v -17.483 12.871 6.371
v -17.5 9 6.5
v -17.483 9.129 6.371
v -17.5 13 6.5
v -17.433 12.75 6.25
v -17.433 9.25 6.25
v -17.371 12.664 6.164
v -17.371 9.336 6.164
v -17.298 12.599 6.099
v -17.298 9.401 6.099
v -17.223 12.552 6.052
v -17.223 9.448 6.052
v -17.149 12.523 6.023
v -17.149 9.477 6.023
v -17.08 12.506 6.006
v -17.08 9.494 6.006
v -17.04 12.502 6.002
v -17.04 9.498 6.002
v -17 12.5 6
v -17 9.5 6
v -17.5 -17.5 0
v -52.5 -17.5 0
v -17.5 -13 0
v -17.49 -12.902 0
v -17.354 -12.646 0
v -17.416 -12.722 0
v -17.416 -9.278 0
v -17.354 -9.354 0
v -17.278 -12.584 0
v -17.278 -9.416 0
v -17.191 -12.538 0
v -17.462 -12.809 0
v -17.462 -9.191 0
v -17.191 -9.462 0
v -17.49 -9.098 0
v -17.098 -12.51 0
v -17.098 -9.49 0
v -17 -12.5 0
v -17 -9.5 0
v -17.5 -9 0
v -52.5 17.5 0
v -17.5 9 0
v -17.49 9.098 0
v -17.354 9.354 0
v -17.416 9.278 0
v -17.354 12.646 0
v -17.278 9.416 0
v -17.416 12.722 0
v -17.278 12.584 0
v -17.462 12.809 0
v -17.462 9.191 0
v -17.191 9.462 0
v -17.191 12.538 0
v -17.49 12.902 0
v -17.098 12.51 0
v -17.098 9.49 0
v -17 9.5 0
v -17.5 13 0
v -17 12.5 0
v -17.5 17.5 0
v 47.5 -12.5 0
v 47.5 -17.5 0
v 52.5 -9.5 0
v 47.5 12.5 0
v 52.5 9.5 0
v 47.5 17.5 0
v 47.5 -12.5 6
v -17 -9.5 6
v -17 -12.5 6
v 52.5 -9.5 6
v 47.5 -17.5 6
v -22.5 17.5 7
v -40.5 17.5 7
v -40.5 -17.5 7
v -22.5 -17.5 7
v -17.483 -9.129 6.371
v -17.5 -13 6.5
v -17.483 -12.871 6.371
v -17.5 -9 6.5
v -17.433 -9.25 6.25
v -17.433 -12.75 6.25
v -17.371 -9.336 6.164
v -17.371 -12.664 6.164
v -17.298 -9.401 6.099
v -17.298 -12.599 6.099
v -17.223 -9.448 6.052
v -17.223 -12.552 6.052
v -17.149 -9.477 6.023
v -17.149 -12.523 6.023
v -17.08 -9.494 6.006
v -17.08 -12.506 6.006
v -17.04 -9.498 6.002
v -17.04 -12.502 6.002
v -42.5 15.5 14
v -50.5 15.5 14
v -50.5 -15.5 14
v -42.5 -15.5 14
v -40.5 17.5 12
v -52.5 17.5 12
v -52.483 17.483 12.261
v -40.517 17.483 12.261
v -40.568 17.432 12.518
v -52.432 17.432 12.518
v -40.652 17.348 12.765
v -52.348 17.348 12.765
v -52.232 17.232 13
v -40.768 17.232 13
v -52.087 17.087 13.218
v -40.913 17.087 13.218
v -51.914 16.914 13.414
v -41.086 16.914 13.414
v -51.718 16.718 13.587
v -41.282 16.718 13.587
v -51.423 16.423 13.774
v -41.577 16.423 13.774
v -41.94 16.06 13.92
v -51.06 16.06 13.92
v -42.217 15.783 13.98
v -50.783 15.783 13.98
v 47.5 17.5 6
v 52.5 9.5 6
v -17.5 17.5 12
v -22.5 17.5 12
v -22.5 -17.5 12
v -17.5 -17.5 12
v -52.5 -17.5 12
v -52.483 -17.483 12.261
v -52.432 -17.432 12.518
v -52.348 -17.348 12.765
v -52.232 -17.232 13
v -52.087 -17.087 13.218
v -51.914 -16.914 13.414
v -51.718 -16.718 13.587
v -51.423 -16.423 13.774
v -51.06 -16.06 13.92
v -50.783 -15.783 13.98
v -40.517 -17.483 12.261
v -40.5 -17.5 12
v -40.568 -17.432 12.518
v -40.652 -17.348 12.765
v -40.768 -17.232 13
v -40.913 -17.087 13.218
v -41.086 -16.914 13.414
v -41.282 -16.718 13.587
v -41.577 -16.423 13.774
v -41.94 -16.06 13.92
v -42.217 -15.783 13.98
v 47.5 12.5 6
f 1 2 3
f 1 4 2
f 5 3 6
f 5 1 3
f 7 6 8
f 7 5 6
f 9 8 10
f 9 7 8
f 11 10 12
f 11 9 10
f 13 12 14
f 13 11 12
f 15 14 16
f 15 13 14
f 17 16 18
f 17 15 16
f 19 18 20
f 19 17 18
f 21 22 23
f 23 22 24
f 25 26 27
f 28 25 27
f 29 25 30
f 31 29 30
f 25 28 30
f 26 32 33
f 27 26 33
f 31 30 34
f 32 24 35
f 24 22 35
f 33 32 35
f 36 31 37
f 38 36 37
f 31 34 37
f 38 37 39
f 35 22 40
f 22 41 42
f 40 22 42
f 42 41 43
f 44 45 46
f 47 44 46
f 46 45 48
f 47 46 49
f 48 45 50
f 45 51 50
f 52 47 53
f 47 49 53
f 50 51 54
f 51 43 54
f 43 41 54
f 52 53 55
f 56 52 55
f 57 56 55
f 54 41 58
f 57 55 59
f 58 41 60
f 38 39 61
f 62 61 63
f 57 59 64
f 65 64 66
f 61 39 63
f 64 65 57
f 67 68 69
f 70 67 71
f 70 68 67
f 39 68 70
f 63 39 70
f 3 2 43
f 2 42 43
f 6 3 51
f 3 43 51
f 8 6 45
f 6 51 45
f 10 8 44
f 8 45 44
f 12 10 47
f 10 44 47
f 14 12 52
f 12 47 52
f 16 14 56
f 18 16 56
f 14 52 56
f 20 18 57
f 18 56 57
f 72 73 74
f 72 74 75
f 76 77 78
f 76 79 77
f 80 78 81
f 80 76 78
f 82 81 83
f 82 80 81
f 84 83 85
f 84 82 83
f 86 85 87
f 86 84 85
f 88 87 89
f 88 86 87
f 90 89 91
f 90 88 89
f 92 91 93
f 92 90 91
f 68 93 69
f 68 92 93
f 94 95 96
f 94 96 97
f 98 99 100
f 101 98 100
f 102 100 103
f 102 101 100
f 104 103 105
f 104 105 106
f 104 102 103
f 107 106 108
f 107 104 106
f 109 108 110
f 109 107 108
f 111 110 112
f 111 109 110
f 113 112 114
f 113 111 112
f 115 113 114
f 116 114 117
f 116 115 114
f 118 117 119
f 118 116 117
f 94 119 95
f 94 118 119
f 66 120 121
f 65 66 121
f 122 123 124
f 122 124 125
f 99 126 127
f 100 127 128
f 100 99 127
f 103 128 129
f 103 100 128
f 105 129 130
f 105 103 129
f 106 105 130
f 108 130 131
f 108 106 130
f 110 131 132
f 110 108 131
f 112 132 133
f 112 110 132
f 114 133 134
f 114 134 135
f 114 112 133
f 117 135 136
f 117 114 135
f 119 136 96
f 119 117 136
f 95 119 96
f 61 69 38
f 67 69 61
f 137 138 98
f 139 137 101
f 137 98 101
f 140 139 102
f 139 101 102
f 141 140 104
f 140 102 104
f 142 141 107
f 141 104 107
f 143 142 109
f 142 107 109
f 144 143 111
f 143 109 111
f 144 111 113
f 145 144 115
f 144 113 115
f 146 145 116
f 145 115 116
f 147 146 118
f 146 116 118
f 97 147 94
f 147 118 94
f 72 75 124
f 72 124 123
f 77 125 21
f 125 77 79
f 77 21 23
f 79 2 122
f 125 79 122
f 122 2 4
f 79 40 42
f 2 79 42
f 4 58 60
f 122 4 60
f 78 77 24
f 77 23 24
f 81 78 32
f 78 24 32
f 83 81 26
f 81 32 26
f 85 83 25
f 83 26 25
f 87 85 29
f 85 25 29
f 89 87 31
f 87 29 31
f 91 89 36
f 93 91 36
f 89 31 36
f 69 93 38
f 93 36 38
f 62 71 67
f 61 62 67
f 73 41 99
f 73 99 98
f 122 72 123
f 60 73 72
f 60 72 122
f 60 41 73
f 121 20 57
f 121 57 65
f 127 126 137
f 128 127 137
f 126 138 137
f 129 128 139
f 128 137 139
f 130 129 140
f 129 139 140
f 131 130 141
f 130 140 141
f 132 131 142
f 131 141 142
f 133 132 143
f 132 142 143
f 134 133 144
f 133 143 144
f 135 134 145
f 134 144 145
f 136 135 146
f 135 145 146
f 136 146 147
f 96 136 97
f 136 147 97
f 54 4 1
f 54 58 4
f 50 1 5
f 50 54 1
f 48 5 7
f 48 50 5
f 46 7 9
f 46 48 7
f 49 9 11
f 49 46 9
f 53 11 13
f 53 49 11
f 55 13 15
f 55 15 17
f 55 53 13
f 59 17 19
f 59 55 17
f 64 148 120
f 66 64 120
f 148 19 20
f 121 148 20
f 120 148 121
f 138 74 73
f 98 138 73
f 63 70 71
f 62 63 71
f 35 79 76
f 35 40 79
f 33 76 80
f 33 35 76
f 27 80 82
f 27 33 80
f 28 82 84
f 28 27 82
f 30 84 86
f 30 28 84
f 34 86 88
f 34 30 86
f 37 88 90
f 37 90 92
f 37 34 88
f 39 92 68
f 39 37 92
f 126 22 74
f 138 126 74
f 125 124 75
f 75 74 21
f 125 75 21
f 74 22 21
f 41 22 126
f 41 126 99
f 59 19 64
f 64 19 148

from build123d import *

# Parameters (mm, degrees)
F0_W      = 105
F0_H      = 35
F1_DEPTH  = 7
F2_W      = 70
F2_H      = 19
F3_DEPTH  = 7.001
F5_DEPTH  = 7.001
F7_DEPTH  = 7.001
F8_W      = 65
F8_H      = 5
F9_DEPTH  = 7.001
F10_W     = 65
F10_H     = 5
F11_DEPTH = 7.001
F12_W     = 5
F12_H     = 35
F13_DEPTH = 5
F14_W     = 12
F14_H     = 35
F15_DEPTH = 7
F16_R     = 2
F17_DEPTH = 1
F18_R     = 0.5


with BuildPart() as f1:
    # F0 (on Top) → F1 (new body)
    with BuildSketch(Plane.XY):
        Rectangle(F0_W, F0_H)
    extrude(amount=F1_DEPTH)

    # F2 (on face) → F3 (cut, through all)
    with BuildSketch(Plane.XY.offset(7)):
        with Locations((17.5, 0)):
            Rectangle(F2_W, F2_H)
    extrude(amount=-F3_DEPTH, mode=Mode.SUBTRACT)

    # F4 (on face) → F5 (cut, through all)
    with BuildSketch(Plane.XY.offset(7)):
        Polygon((52.5, 17.5), (47.5, 17.5), (52.5, 9.5), align=None)
    extrude(amount=-F5_DEPTH, mode=Mode.SUBTRACT)

    # F6 (on face) → F7 (cut, through all)
    with BuildSketch(Plane.XY.offset(7)):
        Polygon((52.5, -9.5), (47.5, -17.5), (52.5, -17.5), align=None)
    extrude(amount=-F7_DEPTH, mode=Mode.SUBTRACT)

    # F8 (on face) → F9 (cut, through all)
    with BuildSketch(Plane.XY.offset(7)):
        with Locations((15, 15)):
            Rectangle(F8_W, F8_H)
    extrude(amount=-F9_DEPTH, mode=Mode.SUBTRACT)

    # F10 (on face) → F11 (cut, through all)
    with BuildSketch(Plane.XY.offset(7)):
        with Locations((15, -15)):
            Rectangle(F10_W, F10_H)
    extrude(amount=-F11_DEPTH, mode=Mode.SUBTRACT)

    # F12 (on face) → F13 (join)
    with BuildSketch(Plane.XY.offset(7)):
        with Locations((-20, 0)):
            Rectangle(F12_W, F12_H)
    extrude(amount=F13_DEPTH)

    # F14 (on face) → F15 (join)
    with BuildSketch(Plane.XY.offset(7)):
        with Locations((-46.5, 0)):
            Rectangle(F14_W, F14_H)
    extrude(amount=F15_DEPTH)

    # F16
    f16_edges = [f1.edges().sort_by_distance(p)[0] for p in [
        (-40.5, 0, 14),
        (-46.5, 17.5, 14),
        (-46.5, -17.5, 14),
        (-52.5, 0, 14),
    ]]
    fillet(f16_edges, radius=F16_R)

    # F17 (cut): faces of the model
    f17_faces = [f1.faces().sort_by_distance(p)[0] for p in [
        (18.1782945736, -11.1085271318, 7),
        (18.1782945736, 11.1085271318, 7),
    ]]
    extrude(f17_faces, amount=-F17_DEPTH, mode=Mode.SUBTRACT)

    # F18
    f18_edges = [f1.edges().sort_by_distance(p)[0] for p in [
        (-17.5, -12.5, 3),
        (-17.5, -11, 6),
        (-17.5, 9.5, 3),
        (-17.5, 11, 6),
        (-17.5, -9.5, 3),
        (-17.5, 12.5, 3),
    ]]
    fillet(f18_edges, radius=F18_R)


solid = f1.part
